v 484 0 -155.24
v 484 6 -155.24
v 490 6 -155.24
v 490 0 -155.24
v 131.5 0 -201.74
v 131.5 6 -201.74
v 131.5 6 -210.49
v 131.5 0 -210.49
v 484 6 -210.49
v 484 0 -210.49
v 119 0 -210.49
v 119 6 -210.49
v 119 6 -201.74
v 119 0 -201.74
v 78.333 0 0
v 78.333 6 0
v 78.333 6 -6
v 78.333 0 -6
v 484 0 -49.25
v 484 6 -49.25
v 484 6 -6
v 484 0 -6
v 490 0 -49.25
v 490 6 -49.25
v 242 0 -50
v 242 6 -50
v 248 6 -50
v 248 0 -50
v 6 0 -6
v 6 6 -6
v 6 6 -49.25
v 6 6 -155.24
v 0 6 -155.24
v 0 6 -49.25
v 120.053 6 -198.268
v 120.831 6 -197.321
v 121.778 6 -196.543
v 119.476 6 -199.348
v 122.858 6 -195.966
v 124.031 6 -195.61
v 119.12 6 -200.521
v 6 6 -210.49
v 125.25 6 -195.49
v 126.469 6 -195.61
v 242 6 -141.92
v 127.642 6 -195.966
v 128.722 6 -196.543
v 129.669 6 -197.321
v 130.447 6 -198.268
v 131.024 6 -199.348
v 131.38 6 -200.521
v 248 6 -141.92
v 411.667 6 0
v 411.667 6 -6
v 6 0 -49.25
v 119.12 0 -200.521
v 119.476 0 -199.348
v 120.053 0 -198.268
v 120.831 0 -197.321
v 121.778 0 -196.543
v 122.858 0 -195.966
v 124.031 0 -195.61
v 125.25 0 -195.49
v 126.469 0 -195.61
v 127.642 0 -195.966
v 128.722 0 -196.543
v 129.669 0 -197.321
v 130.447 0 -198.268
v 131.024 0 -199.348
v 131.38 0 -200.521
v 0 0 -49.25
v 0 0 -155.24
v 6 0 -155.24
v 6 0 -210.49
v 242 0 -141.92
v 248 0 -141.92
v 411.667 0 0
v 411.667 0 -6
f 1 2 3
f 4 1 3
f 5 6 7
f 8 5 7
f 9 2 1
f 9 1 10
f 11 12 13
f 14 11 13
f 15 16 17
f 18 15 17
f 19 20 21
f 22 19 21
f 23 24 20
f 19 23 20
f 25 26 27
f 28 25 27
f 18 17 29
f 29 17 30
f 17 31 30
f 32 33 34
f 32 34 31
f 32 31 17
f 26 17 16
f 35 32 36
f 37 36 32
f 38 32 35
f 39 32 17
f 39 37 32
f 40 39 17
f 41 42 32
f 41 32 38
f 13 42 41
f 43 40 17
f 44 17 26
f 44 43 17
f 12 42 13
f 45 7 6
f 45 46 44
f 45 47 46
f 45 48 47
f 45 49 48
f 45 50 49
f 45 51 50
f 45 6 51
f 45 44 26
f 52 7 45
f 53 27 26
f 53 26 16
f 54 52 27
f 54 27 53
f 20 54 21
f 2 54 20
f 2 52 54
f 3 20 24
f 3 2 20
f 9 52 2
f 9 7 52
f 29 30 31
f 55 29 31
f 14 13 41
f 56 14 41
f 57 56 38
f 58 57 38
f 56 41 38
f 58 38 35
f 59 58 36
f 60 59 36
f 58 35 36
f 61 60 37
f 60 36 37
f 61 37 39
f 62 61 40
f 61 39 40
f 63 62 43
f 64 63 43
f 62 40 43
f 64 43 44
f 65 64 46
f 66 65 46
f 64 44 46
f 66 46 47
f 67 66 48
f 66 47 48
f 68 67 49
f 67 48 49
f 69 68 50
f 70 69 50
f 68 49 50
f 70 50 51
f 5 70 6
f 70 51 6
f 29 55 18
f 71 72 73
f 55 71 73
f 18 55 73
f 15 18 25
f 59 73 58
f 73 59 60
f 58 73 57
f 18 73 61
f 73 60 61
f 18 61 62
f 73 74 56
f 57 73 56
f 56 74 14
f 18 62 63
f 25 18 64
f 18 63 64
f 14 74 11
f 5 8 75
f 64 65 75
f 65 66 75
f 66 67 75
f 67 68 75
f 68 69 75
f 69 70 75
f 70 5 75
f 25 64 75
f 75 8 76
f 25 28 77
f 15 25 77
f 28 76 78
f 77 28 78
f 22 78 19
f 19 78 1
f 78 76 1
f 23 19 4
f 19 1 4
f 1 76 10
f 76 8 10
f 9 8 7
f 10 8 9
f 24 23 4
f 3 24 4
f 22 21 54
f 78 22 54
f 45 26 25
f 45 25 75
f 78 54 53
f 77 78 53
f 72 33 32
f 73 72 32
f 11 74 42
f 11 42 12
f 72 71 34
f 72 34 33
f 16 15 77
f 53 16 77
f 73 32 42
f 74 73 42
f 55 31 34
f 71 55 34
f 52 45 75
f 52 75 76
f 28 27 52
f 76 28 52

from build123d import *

# Parameters (mm, degrees)
SKETCH1_W           = 490
SKETCH1_H           = 210.49
BOSS_EXTRUDE1_DEPTH = 6
SKETCH2_W           = 6
SKETCH2_H           = 55.25
CUT_EXTRUDE1_DEPTH  = 534.331079256
SKETCH3_W           = 6
SKETCH3_H           = 91.92
CUT_EXTRUDE2_DEPTH  = 534.331079256
CUT_EXTRUDE3_DEPTH  = 534.331079256


with BuildPart() as part:
    # Sketch1 → Boss-Extrude1 (new body)
    with BuildSketch(Plane(origin=(0, 0, 0), x_dir=(1, 0, 0), z_dir=(0, 1, 0))):
        with Locations((245, 105.245)):
            Rectangle(SKETCH1_W, SKETCH1_H)
    extrude(amount=BOSS_EXTRUDE1_DEPTH)

    # Sketch2 → Cut-Extrude1 (cut, through all)
    with BuildSketch(Plane(origin=(0, 6, 0), x_dir=(1, 0, 0), z_dir=(0, 1, 0))):
        Polygon((411.666666663, 6), (411.666666663, 0), (490, 0), (490, 49.25), (484, 49.25), (484, 6), align=None)
        Polygon((0, 49.25), (0, 0), (78.33333333, 0), (78.33333333, 6), (6, 6), (6, 49.25), align=None)
        with Locations((487, 182.865)):
            Rectangle(SKETCH2_W, SKETCH2_H)
        with Locations((3, 182.865)):
            Rectangle(SKETCH2_W, SKETCH2_H)
    extrude(amount=-CUT_EXTRUDE1_DEPTH, mode=Mode.SUBTRACT)

    # Sketch3 → Cut-Extrude2 (cut, through all)
    with BuildSketch(Plane(origin=(0, 6, 0), x_dir=(1, 0, 0), z_dir=(0, 1, 0))):
        with Locations((245, 95.96)):
            Rectangle(SKETCH3_W, SKETCH3_H)
    extrude(amount=-CUT_EXTRUDE2_DEPTH, mode=Mode.SUBTRACT)

    # Sketch4 → Cut-Extrude3 (cut, through all)
    with BuildSketch(Plane(origin=(0, 6, 0), x_dir=(1, 0, 0), z_dir=(0, 1, 0))):
        with BuildLine():
            Line((119, 210.49), (119, 201.74))
            ThreePointArc((119, 201.74), (125.25, 195.49), (131.5, 201.74))
            Line((131.5, 201.74), (131.5, 210.49))
            Line((131.5, 210.49), (119, 210.49))
        make_face()
    extrude(amount=-CUT_EXTRUDE3_DEPTH, mode=Mode.SUBTRACT)


solid = part.part
